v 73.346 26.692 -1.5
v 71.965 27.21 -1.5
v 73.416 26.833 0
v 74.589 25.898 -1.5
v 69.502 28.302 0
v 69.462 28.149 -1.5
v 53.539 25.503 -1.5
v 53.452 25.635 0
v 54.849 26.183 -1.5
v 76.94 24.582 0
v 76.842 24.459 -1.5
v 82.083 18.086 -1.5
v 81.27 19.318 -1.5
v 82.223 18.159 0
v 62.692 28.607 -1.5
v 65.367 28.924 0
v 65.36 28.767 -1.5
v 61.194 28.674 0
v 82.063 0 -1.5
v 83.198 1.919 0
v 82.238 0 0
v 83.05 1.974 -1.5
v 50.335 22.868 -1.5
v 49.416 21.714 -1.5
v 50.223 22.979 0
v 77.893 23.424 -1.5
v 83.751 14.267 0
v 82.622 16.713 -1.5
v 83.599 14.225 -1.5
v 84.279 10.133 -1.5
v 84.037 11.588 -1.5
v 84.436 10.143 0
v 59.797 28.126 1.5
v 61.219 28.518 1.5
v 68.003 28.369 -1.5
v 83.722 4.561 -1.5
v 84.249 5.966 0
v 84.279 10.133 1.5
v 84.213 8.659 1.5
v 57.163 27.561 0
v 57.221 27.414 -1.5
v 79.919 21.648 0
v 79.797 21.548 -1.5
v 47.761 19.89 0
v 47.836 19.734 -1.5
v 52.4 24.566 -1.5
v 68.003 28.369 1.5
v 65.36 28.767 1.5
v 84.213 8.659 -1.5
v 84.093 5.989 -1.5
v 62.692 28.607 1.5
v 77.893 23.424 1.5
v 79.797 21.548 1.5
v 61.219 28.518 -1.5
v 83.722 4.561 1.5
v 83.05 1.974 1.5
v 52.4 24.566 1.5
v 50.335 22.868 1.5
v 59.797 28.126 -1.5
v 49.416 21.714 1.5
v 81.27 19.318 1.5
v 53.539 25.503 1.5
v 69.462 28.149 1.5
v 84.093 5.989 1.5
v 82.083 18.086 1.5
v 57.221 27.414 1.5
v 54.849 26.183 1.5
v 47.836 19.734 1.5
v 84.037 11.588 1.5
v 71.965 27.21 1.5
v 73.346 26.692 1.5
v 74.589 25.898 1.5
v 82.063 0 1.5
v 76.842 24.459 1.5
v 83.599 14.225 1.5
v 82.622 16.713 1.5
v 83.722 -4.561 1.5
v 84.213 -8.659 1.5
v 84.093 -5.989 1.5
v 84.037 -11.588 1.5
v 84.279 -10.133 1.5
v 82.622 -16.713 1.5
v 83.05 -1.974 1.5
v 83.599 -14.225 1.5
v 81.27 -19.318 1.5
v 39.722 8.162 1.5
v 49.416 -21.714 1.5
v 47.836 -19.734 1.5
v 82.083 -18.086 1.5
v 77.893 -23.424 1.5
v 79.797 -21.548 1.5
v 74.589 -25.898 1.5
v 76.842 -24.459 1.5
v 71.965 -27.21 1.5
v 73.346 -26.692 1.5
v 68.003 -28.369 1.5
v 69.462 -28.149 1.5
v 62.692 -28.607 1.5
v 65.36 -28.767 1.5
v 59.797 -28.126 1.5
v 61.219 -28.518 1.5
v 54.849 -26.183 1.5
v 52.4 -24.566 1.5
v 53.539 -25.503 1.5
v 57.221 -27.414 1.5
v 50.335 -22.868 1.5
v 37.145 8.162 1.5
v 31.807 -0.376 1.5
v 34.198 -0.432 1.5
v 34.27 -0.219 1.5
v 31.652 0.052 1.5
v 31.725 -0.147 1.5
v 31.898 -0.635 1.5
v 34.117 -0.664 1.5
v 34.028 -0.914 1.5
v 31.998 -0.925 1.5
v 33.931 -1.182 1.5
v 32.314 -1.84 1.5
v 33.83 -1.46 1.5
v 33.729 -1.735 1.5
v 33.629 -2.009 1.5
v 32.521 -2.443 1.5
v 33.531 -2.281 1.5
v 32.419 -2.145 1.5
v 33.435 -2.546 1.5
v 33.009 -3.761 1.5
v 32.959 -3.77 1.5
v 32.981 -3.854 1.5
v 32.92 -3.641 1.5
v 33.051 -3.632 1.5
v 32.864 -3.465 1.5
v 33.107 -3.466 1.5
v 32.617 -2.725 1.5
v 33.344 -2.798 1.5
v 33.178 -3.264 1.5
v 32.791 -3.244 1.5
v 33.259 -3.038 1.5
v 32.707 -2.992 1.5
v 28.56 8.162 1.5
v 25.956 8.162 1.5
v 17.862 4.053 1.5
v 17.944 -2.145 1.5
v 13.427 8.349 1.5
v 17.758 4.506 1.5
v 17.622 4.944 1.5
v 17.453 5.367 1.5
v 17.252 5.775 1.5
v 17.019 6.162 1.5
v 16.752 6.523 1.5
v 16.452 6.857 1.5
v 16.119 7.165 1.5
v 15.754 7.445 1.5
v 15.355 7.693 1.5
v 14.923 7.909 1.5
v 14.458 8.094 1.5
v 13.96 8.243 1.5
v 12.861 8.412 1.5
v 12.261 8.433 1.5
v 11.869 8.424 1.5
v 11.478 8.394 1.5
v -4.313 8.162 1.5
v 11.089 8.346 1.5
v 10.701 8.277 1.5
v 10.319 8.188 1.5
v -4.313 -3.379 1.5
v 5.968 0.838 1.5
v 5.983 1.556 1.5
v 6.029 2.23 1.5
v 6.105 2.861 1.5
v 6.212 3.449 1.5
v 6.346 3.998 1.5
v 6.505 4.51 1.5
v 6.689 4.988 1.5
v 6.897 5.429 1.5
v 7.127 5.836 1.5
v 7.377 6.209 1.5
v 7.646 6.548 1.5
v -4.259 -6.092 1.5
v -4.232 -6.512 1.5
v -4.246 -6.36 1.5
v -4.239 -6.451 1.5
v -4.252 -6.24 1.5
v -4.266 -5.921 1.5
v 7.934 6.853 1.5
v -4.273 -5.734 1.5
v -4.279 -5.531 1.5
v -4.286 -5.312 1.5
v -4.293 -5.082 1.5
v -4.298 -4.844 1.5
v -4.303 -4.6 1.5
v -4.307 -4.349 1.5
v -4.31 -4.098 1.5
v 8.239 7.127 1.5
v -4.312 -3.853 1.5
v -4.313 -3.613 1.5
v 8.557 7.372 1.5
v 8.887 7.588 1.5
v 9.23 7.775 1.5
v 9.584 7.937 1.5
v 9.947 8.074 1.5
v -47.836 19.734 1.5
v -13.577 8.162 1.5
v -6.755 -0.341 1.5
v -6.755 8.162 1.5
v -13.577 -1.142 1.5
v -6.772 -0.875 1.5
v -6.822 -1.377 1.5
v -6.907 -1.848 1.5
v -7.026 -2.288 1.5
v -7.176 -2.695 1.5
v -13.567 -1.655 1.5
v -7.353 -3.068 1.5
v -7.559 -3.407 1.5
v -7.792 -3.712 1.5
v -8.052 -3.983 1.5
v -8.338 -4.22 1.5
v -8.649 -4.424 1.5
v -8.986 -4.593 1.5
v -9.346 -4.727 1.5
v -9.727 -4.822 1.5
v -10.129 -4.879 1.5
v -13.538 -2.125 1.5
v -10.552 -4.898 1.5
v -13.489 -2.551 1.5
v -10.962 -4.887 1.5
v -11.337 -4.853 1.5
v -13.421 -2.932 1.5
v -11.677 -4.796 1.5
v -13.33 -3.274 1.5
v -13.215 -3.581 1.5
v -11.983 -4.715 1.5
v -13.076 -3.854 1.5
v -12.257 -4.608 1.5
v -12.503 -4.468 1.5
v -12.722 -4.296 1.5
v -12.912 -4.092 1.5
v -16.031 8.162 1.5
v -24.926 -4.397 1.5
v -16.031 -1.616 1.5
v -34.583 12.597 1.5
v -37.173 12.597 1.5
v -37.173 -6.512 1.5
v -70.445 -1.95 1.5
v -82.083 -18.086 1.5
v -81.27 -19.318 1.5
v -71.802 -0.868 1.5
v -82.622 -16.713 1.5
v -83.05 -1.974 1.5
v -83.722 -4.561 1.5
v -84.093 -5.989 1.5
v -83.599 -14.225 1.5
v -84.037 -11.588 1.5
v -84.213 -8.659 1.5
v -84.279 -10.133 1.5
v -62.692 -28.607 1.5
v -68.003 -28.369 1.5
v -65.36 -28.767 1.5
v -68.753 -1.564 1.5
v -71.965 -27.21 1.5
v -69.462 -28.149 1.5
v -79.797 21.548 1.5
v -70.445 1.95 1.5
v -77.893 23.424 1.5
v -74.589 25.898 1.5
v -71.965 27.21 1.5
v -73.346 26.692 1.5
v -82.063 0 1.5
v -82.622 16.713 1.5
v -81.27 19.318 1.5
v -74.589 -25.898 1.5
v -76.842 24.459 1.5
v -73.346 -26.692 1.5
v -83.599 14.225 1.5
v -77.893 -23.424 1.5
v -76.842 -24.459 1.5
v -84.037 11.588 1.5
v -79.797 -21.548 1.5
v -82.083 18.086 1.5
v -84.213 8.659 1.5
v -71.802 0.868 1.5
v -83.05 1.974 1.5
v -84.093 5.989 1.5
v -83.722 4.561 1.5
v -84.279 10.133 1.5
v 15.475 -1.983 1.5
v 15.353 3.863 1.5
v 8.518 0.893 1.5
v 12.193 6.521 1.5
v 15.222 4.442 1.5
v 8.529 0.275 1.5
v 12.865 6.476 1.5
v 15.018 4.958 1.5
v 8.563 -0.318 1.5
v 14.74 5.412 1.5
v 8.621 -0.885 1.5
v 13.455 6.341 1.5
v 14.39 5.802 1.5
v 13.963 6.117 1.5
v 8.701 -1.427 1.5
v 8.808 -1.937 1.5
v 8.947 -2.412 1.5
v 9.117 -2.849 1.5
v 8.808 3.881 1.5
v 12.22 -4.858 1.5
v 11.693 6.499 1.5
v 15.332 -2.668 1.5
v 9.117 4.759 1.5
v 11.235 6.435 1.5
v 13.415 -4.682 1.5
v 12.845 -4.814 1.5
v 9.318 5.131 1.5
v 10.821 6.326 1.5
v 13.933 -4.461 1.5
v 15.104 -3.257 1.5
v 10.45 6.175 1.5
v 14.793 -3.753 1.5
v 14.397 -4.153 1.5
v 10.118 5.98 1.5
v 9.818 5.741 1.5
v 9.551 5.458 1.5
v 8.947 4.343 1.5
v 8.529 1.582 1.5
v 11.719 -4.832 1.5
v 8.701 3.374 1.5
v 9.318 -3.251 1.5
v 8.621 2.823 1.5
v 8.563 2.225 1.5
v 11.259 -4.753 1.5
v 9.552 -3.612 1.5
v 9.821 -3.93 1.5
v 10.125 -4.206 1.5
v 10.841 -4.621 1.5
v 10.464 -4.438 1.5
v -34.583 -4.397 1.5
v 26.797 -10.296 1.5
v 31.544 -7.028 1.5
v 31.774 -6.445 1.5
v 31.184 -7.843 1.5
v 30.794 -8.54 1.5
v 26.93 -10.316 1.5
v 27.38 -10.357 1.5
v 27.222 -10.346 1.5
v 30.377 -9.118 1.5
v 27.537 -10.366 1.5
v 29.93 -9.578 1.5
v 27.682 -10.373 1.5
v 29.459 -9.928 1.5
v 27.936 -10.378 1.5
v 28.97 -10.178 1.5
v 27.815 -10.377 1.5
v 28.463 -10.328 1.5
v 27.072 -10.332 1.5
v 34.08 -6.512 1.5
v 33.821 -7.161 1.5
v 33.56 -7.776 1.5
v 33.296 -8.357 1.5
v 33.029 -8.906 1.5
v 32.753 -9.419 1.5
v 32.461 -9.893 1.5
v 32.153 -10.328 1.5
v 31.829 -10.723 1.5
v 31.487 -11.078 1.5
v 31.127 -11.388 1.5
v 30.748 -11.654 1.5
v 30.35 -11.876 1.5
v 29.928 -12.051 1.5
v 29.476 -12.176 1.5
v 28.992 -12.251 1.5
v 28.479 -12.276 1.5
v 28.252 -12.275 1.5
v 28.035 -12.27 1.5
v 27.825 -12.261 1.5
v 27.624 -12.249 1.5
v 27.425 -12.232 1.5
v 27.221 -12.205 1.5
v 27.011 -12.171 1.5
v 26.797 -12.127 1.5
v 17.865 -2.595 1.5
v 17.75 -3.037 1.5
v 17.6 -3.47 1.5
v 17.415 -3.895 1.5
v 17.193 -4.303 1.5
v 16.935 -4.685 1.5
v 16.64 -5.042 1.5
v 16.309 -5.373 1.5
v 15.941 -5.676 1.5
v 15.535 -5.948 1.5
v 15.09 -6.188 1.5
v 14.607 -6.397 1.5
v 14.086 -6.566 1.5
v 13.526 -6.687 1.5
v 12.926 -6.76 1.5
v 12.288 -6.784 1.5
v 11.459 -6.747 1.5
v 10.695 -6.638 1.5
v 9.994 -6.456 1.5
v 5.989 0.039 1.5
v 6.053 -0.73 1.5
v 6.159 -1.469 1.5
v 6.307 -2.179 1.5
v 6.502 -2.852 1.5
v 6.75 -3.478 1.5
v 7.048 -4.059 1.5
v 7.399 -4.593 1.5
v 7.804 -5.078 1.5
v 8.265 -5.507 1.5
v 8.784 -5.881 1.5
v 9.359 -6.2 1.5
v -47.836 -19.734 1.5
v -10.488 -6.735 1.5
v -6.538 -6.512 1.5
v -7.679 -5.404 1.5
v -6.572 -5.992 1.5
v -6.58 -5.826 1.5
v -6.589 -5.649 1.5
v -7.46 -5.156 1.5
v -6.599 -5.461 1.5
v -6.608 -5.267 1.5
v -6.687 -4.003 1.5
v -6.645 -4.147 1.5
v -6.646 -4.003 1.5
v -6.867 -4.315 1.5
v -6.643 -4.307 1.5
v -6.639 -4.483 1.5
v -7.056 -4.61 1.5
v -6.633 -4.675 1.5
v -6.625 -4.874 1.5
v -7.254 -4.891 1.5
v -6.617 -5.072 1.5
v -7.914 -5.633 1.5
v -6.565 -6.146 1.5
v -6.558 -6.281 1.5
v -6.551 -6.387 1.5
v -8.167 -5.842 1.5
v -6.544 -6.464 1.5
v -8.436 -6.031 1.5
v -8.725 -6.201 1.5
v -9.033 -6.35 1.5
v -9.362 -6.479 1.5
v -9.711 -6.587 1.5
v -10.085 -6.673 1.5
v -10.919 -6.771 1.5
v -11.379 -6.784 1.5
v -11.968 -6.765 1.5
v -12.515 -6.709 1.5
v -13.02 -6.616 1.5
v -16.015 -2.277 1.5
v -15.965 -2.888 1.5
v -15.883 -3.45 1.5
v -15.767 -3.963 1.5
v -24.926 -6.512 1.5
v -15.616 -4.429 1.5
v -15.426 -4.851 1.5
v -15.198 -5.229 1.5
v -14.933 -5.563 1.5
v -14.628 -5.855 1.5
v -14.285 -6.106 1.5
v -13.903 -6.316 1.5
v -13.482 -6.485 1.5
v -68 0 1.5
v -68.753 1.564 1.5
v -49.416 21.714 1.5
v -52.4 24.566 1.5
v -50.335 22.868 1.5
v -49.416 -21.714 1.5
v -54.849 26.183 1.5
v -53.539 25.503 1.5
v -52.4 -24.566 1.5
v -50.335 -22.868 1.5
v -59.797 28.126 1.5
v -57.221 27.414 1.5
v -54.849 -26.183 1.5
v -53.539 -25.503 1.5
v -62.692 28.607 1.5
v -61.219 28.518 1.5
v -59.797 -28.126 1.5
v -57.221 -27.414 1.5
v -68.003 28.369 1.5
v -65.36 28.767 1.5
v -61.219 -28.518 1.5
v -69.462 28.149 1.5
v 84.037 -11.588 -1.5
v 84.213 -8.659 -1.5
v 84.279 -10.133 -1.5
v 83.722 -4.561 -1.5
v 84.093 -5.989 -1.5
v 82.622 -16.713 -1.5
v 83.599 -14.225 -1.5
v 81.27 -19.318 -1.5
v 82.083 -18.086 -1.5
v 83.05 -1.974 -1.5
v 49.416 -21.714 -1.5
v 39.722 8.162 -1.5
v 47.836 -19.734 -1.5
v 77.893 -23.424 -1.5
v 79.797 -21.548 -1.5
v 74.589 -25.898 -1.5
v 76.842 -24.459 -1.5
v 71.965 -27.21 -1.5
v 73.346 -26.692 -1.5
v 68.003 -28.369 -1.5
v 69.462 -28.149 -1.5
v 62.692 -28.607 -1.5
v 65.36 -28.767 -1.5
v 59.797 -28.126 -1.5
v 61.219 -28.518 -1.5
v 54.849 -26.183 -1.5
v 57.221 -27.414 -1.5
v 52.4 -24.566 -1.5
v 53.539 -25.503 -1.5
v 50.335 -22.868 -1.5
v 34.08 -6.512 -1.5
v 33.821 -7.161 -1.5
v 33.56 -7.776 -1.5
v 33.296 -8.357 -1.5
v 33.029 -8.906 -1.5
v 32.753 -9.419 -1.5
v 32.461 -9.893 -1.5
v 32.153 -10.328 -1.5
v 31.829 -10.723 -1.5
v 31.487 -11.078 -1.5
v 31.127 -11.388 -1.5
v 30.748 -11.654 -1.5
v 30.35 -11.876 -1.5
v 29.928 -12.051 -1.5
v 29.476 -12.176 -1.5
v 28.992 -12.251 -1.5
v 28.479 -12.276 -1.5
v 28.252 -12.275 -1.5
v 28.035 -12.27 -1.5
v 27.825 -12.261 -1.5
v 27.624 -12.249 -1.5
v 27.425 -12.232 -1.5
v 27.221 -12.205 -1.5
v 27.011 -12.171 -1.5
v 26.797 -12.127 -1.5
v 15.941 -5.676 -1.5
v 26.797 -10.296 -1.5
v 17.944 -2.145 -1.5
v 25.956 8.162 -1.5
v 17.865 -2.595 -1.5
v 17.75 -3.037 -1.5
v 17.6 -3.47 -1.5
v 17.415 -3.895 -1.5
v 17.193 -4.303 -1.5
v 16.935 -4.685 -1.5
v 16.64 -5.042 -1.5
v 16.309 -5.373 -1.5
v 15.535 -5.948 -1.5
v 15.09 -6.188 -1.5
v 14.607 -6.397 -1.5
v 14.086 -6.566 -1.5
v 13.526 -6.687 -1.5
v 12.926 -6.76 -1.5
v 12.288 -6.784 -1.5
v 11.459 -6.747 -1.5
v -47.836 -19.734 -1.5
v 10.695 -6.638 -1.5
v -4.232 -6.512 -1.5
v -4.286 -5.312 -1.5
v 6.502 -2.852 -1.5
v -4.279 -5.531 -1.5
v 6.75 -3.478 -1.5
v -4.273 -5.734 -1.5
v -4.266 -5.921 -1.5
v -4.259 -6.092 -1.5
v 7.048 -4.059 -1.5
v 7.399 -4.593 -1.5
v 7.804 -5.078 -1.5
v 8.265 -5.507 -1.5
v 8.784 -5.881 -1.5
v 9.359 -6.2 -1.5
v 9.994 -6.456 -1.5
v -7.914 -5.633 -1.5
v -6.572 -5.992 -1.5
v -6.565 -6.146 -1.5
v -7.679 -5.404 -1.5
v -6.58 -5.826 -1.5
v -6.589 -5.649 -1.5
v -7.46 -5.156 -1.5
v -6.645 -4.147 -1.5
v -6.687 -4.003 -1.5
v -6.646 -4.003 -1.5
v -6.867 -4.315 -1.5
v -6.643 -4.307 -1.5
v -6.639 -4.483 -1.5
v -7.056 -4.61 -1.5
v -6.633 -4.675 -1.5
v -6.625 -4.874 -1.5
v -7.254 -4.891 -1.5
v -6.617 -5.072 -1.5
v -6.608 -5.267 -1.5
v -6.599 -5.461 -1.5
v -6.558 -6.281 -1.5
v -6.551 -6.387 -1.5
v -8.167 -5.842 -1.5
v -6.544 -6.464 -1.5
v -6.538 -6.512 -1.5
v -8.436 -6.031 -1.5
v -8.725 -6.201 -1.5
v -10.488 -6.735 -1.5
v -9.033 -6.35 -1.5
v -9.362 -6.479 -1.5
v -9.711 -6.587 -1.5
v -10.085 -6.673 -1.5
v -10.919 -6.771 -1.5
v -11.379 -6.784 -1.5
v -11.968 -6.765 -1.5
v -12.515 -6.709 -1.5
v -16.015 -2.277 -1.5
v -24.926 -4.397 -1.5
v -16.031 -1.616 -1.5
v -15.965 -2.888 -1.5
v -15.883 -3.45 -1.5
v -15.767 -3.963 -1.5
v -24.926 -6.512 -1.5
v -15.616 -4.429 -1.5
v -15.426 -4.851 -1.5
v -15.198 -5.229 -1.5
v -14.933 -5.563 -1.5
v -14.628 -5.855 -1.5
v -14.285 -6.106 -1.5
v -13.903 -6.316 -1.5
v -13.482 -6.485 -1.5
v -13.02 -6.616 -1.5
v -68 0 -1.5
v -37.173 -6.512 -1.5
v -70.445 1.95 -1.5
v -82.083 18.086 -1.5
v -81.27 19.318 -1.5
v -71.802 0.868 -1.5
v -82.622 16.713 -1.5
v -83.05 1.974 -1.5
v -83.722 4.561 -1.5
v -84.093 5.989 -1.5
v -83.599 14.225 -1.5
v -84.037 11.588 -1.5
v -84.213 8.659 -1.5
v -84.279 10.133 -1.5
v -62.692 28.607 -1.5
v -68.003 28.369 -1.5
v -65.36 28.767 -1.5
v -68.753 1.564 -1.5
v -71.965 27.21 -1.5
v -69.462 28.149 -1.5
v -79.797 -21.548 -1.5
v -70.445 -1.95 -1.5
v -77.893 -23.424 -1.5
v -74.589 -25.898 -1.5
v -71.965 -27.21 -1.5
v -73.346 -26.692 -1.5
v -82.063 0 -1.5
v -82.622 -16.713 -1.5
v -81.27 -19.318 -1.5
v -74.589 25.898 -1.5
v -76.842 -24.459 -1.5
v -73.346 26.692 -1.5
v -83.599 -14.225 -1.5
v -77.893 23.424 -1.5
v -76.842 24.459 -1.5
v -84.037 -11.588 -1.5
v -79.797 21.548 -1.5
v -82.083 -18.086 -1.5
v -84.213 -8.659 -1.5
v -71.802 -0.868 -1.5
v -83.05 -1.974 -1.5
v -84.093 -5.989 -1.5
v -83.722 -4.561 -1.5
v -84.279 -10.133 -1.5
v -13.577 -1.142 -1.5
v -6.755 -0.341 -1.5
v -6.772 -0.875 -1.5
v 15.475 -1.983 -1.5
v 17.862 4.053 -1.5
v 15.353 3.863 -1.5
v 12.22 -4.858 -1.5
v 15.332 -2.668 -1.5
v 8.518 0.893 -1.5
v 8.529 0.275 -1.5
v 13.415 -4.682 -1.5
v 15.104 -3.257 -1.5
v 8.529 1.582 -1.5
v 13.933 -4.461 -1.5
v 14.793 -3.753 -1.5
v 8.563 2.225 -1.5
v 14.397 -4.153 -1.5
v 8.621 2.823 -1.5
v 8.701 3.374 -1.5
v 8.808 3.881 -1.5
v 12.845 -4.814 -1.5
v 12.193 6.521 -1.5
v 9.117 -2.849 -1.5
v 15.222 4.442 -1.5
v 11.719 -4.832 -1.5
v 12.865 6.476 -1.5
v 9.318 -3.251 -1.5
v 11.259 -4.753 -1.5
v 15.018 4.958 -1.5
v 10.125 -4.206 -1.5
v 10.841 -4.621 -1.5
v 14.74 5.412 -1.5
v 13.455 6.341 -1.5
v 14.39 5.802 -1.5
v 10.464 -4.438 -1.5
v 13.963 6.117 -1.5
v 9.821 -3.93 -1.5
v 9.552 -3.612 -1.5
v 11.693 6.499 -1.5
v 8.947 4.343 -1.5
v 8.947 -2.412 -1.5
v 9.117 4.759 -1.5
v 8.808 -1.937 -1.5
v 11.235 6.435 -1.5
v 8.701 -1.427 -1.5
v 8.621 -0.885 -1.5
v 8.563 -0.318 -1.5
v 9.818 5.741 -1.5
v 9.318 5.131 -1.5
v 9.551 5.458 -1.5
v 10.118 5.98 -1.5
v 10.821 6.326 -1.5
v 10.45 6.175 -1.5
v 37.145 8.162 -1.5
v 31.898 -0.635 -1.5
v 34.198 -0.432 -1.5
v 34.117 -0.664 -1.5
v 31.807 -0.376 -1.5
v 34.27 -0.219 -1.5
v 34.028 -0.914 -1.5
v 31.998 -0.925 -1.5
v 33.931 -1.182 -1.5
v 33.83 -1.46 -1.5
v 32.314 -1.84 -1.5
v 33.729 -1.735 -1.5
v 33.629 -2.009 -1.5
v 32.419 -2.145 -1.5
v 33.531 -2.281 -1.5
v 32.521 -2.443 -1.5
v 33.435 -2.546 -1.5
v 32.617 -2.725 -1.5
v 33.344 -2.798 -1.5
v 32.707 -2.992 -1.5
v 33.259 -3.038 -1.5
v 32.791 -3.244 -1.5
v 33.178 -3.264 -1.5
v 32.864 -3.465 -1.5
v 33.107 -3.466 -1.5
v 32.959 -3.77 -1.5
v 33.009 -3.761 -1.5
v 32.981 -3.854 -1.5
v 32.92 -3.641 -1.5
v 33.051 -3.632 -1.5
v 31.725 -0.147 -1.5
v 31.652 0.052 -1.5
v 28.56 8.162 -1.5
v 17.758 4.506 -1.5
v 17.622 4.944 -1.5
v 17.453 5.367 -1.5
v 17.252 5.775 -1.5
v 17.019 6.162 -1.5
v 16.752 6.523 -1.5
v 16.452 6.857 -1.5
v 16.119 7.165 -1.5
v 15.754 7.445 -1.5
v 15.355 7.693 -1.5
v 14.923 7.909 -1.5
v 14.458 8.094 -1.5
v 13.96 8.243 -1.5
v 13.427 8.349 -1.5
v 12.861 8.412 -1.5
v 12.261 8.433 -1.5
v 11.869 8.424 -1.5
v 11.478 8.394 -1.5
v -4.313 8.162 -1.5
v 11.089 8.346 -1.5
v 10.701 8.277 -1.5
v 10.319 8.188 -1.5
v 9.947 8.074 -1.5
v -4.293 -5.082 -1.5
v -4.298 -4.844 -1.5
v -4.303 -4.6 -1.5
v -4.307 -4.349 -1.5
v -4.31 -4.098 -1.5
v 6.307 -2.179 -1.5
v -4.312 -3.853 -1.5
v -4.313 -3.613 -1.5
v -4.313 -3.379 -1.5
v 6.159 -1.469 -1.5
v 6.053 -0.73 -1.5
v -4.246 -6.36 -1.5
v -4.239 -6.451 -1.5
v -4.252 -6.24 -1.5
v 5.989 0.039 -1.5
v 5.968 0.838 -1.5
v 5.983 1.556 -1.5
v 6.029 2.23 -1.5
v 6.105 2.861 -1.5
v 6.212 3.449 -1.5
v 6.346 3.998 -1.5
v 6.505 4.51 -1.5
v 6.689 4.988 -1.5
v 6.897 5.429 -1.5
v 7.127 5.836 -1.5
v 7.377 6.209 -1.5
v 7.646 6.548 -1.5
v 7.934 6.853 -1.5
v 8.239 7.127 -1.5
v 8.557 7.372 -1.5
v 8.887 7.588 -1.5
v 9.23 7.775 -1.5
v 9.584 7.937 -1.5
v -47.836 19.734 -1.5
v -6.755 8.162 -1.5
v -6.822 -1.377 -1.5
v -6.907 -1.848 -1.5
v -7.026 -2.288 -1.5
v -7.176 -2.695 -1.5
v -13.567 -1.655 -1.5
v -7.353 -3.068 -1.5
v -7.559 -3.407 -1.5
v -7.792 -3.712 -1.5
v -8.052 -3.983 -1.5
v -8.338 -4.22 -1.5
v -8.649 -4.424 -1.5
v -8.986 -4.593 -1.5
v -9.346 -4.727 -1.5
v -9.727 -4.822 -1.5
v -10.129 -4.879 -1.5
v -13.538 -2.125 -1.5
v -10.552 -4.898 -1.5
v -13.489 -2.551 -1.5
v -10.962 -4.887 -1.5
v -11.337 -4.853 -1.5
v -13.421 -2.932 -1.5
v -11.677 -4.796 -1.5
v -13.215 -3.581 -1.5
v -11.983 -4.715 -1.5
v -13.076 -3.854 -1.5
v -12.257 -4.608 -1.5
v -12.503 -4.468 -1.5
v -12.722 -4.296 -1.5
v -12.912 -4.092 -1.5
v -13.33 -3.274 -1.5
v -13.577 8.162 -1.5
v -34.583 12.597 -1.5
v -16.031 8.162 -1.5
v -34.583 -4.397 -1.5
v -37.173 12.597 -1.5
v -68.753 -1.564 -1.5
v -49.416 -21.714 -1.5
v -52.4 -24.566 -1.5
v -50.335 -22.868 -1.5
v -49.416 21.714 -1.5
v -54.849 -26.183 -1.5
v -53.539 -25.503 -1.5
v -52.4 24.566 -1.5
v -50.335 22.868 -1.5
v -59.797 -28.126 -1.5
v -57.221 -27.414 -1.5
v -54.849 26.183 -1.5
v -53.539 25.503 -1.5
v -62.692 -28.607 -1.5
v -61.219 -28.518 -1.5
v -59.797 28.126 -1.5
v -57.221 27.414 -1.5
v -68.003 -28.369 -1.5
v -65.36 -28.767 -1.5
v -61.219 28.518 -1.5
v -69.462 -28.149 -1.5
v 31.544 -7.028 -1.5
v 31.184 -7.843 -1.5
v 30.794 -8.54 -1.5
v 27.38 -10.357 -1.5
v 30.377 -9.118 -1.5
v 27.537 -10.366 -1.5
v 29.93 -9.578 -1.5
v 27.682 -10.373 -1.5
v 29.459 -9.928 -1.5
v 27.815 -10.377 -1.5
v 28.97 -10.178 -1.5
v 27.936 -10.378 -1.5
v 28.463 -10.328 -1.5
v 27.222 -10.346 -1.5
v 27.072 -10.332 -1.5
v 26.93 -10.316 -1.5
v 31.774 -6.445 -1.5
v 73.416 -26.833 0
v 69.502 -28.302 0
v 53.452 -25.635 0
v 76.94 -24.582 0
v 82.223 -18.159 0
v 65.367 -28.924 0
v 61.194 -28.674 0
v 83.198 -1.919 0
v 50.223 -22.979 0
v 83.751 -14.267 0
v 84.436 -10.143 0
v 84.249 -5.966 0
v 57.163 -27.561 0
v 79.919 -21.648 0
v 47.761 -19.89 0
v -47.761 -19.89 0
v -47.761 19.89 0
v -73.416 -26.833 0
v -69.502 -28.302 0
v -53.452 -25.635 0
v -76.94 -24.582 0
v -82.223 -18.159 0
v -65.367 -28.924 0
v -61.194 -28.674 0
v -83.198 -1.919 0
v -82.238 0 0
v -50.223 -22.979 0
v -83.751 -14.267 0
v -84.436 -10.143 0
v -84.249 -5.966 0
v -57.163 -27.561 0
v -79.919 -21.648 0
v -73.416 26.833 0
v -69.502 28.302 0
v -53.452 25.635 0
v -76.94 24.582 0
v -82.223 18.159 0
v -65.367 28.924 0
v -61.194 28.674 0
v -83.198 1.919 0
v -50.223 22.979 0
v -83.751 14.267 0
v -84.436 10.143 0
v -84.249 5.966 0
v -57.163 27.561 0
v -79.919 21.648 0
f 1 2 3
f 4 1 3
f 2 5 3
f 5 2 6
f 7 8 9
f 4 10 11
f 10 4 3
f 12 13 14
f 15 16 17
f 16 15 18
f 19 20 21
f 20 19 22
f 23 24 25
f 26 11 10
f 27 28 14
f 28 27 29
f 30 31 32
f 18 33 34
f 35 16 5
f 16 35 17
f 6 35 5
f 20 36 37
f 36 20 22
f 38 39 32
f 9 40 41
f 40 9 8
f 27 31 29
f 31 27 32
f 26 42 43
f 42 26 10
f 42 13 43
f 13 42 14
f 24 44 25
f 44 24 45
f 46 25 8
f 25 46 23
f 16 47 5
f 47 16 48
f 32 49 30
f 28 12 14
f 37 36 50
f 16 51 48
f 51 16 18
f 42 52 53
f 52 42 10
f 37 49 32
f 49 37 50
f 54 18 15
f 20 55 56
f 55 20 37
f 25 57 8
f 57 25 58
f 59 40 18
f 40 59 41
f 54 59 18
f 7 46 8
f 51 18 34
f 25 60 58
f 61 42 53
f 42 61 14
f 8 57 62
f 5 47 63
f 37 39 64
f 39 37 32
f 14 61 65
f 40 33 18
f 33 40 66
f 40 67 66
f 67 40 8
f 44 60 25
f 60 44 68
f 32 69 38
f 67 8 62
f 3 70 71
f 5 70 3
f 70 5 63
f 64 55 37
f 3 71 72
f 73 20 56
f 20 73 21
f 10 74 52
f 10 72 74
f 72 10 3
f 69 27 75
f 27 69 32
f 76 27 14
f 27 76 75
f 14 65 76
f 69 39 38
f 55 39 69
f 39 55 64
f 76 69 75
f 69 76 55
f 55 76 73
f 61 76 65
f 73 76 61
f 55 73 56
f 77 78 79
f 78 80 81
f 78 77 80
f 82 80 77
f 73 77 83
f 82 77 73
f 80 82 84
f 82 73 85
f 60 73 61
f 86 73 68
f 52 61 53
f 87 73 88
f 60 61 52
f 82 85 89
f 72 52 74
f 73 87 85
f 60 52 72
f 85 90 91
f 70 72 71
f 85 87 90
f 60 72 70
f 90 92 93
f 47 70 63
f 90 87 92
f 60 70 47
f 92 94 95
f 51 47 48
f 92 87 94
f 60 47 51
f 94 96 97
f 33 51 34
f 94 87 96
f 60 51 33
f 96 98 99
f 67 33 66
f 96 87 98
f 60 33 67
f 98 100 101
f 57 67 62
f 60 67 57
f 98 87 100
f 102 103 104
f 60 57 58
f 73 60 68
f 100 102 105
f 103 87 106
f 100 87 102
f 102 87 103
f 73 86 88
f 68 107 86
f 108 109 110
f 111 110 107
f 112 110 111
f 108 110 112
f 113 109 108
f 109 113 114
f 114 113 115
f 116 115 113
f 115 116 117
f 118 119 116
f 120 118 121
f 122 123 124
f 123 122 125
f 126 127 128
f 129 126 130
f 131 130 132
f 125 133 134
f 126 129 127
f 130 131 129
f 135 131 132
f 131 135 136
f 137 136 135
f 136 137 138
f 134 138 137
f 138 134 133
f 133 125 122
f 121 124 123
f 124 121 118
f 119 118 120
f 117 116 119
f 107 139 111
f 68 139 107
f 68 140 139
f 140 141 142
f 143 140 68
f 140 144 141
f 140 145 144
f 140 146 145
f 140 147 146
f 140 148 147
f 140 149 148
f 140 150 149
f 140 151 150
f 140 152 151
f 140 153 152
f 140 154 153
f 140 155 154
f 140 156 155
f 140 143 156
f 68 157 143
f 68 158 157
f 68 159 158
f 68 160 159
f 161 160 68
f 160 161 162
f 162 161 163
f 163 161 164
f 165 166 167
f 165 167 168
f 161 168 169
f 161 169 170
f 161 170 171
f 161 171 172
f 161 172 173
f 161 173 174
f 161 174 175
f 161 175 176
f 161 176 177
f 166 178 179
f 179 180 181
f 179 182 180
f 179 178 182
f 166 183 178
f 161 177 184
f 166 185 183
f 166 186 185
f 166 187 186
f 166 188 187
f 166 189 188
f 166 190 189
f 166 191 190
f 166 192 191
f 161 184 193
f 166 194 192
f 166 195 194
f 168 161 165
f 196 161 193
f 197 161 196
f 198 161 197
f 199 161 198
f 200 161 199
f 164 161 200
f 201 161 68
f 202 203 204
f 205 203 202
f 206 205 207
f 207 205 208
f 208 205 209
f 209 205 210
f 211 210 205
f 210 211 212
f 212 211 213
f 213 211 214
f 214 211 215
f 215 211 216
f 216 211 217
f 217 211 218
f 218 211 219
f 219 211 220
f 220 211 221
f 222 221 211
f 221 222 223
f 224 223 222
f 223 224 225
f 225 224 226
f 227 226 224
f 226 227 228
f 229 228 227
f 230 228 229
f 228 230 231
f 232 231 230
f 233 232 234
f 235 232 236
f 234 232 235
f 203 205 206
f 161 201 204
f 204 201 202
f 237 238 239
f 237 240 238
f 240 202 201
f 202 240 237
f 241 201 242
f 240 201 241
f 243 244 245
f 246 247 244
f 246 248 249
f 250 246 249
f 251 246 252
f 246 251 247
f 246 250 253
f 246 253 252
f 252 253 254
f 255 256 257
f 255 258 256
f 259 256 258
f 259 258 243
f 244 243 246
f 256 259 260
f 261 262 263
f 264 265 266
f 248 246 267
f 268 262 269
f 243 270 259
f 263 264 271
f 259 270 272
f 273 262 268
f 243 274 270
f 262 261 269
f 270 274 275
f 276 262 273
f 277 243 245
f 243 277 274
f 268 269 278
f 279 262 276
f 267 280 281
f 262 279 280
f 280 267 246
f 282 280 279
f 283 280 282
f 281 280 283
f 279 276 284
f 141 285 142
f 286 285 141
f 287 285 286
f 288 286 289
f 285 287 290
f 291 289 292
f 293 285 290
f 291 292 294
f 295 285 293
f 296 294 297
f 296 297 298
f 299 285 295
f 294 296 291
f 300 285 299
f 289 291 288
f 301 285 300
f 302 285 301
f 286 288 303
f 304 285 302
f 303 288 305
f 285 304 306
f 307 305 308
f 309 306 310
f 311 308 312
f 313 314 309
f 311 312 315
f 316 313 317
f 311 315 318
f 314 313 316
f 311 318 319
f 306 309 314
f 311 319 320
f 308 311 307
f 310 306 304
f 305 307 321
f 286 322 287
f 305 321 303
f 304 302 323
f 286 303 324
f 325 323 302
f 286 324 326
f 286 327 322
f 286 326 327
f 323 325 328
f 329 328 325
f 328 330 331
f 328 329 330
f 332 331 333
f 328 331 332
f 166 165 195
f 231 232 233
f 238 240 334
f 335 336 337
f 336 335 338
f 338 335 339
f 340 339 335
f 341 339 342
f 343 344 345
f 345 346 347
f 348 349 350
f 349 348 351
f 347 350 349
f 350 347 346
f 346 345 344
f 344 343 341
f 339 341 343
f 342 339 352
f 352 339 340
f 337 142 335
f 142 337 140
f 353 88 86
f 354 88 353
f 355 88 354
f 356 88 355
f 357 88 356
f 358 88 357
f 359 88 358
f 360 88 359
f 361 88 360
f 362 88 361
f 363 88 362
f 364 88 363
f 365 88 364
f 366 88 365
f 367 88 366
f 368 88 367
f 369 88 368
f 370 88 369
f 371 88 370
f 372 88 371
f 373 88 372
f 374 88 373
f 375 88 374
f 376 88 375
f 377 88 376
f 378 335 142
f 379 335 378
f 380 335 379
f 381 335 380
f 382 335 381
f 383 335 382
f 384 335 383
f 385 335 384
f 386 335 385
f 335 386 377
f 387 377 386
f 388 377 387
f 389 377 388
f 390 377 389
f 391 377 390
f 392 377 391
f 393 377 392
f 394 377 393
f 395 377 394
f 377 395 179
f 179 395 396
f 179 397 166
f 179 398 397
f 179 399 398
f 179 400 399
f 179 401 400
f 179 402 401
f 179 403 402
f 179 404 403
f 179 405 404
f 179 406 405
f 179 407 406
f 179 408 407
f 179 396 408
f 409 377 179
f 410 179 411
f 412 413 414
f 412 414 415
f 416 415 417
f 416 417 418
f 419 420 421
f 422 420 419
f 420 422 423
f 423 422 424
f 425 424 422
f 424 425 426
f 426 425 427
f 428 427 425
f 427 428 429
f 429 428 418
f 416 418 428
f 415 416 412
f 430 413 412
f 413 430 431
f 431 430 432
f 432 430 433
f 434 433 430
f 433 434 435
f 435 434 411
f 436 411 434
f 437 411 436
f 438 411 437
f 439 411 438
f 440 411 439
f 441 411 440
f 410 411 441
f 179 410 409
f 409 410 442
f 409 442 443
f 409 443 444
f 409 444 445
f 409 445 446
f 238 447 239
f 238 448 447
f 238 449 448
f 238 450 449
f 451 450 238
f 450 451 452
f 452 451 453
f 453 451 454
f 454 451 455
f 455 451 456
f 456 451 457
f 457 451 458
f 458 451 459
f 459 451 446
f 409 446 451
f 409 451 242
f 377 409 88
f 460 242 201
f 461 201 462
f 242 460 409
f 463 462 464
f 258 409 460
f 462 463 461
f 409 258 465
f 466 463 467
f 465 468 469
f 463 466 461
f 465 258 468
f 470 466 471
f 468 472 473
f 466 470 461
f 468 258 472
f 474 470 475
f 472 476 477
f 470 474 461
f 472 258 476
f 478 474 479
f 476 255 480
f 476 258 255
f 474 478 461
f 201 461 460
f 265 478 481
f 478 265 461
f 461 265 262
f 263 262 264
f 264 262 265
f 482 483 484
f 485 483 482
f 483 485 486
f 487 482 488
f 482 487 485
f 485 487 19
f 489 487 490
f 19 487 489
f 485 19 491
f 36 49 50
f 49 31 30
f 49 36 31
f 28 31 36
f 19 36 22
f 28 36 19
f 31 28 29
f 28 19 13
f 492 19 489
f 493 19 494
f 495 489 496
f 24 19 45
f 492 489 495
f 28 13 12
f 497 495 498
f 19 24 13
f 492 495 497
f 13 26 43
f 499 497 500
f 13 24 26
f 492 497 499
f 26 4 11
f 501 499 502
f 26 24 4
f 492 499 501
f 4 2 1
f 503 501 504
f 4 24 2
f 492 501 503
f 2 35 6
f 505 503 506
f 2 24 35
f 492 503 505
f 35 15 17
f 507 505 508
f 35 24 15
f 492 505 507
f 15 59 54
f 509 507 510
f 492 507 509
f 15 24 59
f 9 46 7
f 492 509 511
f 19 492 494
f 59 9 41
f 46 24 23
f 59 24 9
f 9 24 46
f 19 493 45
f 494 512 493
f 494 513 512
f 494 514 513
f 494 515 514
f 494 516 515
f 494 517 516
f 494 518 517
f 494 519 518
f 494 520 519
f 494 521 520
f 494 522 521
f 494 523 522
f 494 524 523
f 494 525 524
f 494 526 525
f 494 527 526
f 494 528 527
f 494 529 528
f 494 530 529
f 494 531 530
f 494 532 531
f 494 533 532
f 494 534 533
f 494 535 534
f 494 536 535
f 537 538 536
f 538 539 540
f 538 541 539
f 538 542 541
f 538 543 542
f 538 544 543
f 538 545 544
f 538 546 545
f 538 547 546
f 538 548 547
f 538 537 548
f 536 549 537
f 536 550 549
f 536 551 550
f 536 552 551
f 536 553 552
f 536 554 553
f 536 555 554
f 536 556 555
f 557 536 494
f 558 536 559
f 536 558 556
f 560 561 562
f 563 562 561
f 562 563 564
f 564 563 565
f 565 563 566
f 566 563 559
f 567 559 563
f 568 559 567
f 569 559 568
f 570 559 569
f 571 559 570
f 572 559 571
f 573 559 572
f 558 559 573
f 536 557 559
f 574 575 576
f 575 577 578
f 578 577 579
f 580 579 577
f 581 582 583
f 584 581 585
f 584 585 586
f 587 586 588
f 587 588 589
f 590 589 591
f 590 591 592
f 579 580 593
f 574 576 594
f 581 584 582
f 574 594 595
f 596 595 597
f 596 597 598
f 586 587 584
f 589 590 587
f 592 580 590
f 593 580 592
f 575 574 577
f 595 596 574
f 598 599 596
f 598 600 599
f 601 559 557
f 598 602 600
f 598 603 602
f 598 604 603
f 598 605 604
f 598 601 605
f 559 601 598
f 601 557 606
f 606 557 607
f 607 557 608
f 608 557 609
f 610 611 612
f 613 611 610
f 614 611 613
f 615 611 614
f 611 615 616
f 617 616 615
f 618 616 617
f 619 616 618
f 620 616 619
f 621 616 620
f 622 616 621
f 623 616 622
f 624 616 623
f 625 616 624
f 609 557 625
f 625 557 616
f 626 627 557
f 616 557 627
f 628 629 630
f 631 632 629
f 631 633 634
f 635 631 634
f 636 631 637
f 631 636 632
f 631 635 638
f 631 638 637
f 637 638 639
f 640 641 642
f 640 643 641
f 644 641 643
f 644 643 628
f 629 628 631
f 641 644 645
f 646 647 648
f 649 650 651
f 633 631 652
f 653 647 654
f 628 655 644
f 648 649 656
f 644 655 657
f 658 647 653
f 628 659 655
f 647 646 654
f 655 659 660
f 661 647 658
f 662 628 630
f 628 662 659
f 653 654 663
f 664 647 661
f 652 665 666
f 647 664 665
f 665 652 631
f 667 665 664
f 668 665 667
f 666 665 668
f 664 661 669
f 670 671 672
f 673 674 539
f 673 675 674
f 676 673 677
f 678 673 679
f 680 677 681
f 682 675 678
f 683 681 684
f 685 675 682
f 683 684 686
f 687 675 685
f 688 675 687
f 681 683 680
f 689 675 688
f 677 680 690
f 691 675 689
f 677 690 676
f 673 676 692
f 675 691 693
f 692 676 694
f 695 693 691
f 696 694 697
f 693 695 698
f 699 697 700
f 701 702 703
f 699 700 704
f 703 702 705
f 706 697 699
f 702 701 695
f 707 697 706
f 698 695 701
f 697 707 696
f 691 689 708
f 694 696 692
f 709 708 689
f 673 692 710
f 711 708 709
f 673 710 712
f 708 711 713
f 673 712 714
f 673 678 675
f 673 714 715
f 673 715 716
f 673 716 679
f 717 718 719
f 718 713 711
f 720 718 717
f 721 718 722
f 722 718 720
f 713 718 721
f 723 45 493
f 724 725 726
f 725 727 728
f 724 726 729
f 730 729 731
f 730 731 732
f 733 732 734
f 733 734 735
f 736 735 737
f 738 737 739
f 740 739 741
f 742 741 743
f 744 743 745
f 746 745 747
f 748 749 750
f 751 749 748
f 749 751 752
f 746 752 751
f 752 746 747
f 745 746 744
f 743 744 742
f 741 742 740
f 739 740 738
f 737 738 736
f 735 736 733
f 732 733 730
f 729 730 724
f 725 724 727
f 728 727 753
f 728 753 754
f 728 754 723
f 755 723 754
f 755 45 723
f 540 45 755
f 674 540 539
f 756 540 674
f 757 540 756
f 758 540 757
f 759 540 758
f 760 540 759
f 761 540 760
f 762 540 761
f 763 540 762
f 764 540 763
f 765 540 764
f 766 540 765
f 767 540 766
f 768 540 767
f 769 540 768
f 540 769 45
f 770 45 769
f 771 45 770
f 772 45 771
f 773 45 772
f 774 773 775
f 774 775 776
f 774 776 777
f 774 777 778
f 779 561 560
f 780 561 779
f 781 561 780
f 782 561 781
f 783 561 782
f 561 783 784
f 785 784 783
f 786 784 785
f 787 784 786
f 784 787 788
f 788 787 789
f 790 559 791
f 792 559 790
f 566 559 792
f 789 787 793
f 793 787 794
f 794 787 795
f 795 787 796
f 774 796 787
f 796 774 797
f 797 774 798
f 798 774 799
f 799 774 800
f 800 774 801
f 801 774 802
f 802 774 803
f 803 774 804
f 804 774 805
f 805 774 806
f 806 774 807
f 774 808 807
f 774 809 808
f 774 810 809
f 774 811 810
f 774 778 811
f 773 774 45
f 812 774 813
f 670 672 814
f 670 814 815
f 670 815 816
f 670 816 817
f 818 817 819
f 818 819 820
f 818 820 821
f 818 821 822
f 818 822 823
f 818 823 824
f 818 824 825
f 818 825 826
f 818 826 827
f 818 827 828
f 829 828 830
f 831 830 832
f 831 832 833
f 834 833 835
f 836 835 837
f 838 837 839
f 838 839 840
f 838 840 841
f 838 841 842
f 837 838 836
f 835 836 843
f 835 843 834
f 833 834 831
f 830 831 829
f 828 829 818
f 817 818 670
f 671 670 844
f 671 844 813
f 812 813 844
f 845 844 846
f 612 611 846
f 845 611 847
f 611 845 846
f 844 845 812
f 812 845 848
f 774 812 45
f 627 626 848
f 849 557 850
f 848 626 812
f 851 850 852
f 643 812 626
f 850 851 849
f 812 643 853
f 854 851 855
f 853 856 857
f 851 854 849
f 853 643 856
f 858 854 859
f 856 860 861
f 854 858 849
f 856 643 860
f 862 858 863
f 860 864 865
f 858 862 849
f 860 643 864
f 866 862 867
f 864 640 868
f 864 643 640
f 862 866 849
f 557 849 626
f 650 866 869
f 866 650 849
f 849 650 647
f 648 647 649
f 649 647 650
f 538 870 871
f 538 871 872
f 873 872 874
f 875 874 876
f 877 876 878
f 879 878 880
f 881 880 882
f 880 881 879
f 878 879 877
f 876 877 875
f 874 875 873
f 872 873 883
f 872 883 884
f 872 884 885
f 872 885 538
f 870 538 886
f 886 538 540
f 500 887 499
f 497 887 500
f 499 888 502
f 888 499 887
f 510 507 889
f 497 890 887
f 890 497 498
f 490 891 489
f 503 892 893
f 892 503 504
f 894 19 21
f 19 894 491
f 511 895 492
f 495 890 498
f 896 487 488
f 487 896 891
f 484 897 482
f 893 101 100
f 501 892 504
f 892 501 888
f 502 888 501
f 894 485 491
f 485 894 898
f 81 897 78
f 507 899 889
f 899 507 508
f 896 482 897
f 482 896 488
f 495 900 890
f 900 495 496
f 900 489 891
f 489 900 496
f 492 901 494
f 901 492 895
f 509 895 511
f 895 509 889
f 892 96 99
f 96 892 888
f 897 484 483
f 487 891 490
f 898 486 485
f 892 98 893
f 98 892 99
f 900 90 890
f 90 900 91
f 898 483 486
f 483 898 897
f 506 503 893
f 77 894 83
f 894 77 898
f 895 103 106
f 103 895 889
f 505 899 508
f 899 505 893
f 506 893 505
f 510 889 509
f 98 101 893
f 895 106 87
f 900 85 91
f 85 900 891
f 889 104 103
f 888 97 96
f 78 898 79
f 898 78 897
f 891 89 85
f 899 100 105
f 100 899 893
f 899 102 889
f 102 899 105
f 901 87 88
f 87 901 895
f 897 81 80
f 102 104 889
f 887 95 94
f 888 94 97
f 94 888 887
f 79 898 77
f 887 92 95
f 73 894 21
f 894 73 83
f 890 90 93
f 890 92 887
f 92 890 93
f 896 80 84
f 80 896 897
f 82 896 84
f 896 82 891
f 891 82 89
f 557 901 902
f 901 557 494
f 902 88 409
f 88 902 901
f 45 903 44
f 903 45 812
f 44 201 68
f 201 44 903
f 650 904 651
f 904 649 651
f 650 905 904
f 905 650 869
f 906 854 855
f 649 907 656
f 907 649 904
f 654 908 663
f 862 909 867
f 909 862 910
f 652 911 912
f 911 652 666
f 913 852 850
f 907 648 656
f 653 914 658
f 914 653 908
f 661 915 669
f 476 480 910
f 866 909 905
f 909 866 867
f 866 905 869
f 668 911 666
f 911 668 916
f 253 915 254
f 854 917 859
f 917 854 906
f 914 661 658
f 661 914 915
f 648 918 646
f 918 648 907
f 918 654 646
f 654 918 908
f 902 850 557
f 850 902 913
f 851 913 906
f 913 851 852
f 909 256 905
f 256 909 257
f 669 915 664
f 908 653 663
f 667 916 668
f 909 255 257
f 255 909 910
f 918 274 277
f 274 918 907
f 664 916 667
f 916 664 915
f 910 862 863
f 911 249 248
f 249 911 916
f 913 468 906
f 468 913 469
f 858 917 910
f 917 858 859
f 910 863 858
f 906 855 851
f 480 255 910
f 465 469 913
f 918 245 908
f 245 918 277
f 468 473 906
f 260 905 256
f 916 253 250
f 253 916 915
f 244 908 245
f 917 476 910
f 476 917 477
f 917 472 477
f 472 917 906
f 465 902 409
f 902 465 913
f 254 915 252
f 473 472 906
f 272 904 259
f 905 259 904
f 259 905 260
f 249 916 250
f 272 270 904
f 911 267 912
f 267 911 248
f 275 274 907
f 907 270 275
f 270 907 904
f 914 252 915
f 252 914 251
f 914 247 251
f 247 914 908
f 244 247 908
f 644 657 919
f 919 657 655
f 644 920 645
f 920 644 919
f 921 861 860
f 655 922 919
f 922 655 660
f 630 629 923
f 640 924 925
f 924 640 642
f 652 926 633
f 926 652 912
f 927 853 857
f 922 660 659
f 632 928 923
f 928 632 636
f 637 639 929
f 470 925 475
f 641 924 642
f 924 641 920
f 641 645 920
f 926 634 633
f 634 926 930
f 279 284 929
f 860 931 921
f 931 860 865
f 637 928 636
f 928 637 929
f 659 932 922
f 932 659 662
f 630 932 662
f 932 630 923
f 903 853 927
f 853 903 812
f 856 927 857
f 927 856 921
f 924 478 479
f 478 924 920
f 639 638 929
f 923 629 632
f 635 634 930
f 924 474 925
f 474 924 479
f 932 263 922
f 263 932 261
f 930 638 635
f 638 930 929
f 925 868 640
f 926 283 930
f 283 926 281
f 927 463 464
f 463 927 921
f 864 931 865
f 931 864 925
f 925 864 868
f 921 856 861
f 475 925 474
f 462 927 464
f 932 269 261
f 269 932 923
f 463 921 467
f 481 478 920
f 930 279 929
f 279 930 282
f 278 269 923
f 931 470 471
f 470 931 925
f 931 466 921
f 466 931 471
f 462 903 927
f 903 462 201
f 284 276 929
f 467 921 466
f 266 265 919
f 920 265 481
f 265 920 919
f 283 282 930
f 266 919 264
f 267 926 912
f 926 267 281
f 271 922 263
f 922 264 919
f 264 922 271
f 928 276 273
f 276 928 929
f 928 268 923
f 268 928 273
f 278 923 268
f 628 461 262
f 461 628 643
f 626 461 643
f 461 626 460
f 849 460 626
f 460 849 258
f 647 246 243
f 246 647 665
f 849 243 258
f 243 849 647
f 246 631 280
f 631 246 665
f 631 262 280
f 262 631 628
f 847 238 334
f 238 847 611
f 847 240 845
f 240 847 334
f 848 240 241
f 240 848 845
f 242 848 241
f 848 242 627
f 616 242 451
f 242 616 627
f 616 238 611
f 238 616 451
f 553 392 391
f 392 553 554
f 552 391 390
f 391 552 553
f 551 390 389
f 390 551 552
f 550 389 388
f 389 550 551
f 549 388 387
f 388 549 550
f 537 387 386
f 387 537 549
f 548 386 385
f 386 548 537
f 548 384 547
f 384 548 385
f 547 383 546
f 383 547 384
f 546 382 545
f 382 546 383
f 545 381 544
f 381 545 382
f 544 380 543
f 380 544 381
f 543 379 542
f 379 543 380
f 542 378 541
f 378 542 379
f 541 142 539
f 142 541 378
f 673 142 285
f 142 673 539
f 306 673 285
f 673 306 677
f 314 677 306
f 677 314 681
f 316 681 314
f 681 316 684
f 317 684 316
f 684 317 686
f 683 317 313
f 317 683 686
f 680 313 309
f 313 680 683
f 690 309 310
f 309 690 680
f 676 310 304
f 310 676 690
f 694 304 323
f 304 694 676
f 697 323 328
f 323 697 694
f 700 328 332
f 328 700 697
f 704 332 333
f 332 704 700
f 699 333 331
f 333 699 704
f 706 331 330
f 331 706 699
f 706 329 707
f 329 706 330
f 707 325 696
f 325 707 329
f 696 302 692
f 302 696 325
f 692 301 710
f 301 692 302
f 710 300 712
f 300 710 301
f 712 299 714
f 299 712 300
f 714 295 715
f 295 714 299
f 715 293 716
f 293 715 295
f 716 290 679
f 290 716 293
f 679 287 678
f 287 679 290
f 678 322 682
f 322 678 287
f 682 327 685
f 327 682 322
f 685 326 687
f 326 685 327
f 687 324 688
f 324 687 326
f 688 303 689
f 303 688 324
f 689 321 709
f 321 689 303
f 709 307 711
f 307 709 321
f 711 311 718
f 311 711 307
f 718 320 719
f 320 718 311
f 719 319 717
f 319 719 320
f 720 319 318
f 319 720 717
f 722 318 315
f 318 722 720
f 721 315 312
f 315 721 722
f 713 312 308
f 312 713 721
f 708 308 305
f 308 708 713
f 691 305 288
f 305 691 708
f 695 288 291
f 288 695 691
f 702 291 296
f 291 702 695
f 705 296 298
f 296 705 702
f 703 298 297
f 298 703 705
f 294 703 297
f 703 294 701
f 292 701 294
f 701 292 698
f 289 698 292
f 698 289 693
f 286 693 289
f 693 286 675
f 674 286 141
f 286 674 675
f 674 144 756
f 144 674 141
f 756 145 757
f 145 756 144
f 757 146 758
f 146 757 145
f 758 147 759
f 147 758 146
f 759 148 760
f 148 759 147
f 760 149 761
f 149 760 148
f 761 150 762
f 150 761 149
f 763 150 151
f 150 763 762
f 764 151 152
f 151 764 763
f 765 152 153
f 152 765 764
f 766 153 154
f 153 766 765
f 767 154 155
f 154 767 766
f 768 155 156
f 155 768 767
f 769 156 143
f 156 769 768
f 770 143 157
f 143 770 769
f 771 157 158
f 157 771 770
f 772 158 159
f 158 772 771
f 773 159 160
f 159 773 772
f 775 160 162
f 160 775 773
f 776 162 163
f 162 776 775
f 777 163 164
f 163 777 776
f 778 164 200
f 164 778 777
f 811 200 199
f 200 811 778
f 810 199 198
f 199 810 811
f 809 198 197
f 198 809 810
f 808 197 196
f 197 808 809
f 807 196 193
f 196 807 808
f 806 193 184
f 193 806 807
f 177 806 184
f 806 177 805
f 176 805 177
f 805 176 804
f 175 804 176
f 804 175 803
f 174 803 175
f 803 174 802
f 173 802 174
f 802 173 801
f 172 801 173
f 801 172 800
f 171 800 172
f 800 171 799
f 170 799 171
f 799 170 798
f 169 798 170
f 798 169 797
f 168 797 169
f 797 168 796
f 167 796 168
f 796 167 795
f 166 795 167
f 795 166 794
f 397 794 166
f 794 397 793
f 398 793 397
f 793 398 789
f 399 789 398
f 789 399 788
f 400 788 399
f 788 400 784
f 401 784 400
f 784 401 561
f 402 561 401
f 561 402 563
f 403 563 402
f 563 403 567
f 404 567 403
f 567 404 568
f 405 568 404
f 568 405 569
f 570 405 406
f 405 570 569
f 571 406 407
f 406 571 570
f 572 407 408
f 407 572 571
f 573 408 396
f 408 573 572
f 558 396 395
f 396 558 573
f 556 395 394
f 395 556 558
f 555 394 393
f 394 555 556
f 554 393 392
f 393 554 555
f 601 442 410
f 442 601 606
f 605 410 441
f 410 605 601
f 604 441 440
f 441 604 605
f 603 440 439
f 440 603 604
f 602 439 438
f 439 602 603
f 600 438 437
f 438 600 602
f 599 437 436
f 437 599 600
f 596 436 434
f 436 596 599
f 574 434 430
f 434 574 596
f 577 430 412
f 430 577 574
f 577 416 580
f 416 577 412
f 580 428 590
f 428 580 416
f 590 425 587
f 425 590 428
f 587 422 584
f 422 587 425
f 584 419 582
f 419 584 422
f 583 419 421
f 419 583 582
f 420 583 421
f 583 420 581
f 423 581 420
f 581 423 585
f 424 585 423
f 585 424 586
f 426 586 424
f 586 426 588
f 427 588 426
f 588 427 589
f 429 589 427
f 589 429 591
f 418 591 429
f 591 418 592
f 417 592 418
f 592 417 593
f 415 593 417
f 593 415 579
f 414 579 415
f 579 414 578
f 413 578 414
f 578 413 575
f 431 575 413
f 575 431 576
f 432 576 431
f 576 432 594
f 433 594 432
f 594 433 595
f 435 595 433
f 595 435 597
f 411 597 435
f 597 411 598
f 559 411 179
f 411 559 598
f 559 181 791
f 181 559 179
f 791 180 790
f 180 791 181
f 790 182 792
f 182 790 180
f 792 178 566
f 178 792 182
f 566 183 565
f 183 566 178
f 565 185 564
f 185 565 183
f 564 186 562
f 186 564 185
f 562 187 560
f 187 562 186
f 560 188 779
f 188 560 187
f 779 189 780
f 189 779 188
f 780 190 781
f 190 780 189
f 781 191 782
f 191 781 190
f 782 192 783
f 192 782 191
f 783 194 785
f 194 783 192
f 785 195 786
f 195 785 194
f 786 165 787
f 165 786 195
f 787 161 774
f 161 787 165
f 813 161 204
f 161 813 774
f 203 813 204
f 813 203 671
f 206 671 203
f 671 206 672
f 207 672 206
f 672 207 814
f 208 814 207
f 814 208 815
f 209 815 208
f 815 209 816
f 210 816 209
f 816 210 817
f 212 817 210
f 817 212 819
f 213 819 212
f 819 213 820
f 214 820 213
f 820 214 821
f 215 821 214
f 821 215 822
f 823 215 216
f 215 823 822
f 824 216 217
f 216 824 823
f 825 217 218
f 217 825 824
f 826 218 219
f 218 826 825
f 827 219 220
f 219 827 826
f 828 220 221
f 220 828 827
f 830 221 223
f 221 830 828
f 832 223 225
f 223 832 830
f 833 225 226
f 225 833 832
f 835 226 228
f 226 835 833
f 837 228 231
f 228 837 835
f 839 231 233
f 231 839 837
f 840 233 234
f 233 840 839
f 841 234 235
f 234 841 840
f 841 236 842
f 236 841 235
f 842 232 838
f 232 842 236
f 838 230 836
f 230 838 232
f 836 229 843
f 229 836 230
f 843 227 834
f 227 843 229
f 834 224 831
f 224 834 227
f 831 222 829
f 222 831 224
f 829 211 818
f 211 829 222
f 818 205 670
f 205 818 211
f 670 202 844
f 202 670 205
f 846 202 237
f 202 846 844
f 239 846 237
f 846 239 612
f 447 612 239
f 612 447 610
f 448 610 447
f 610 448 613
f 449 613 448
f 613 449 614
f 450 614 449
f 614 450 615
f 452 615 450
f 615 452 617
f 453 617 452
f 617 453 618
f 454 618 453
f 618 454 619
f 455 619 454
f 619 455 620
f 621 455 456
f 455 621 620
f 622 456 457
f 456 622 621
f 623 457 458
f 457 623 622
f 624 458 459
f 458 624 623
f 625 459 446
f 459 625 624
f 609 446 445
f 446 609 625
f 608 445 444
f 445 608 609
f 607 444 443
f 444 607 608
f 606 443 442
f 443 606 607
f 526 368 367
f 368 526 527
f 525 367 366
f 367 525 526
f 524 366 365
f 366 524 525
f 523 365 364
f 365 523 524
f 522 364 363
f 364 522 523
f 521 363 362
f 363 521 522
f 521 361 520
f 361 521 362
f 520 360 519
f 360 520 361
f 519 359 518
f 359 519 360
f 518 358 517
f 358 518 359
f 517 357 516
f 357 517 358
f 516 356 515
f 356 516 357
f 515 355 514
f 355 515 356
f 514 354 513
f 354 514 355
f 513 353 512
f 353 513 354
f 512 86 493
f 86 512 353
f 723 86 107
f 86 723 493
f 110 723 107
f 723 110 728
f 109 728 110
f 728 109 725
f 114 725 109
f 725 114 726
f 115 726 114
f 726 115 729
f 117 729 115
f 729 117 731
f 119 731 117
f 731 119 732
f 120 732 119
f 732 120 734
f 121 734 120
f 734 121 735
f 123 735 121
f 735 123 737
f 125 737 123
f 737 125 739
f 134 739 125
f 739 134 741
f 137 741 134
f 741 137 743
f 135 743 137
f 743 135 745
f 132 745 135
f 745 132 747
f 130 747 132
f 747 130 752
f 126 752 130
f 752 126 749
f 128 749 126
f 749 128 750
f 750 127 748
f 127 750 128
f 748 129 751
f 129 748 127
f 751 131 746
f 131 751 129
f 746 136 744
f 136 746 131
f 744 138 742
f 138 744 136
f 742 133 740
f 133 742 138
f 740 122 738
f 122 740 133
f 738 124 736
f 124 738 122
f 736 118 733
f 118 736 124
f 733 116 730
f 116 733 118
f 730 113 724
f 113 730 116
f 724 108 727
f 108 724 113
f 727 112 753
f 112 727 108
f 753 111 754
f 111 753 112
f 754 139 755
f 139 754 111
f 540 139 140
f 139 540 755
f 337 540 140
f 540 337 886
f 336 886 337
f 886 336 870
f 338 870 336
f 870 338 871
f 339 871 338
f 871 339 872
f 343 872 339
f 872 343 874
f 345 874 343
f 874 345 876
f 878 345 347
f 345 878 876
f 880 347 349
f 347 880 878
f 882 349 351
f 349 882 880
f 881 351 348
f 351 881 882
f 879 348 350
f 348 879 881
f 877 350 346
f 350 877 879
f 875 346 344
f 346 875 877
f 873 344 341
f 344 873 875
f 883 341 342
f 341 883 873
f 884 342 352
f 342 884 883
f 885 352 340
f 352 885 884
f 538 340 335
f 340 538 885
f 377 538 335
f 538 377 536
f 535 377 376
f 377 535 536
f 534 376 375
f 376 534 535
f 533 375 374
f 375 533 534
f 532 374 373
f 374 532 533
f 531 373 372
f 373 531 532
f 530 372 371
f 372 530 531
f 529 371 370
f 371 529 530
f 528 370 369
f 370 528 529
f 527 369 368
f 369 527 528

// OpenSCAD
hw = 40;
hl = 60;
l = 160;
w = 40;
h = 3;
hole_dia = 4;
hole_offset = 10;


module pill(l, w, h) {
    difference() {
        hull() {
            translate([ (l-w)/2, 0, 0]) sphere(d=w);
            translate([-(l-w)/2, 0, 0]) sphere(d=w);
        }
        
        
        translate([0, 0,  (w+h)/2]) cube([l, l, w], center = true);
        translate([0, 0, -(w+h)/2]) cube([l, l, w], center = true);
    }
        
}

module heart() {
    module solid() {
        difference() {
            rotate([0, 0, atan2(hw, hl-hw)]) pill(hl, hw, h);
            translate([0, -hw/2, 0]) cube([hl, hw, h], center=true);
        }
    }

    solid();
    mirror([0, 1, 0]) solid();
}


module bone() {
    translate([(l-w)/2, 0, 0]) heart();
    pill(l, w, h);
    rotate([0, 0, 180]) translate([(l-w)/2, 0, 0]) heart();
}

difference() {
    bone();
    translate([-l/2+hole_offset, 0, 0]) cylinder(h=h, d = hole_dia, center=true);
    translate([0,0,-h/2]) linear_extrude(h) text("L u c y", size = w/2, halign = "center", valign="center");
}
